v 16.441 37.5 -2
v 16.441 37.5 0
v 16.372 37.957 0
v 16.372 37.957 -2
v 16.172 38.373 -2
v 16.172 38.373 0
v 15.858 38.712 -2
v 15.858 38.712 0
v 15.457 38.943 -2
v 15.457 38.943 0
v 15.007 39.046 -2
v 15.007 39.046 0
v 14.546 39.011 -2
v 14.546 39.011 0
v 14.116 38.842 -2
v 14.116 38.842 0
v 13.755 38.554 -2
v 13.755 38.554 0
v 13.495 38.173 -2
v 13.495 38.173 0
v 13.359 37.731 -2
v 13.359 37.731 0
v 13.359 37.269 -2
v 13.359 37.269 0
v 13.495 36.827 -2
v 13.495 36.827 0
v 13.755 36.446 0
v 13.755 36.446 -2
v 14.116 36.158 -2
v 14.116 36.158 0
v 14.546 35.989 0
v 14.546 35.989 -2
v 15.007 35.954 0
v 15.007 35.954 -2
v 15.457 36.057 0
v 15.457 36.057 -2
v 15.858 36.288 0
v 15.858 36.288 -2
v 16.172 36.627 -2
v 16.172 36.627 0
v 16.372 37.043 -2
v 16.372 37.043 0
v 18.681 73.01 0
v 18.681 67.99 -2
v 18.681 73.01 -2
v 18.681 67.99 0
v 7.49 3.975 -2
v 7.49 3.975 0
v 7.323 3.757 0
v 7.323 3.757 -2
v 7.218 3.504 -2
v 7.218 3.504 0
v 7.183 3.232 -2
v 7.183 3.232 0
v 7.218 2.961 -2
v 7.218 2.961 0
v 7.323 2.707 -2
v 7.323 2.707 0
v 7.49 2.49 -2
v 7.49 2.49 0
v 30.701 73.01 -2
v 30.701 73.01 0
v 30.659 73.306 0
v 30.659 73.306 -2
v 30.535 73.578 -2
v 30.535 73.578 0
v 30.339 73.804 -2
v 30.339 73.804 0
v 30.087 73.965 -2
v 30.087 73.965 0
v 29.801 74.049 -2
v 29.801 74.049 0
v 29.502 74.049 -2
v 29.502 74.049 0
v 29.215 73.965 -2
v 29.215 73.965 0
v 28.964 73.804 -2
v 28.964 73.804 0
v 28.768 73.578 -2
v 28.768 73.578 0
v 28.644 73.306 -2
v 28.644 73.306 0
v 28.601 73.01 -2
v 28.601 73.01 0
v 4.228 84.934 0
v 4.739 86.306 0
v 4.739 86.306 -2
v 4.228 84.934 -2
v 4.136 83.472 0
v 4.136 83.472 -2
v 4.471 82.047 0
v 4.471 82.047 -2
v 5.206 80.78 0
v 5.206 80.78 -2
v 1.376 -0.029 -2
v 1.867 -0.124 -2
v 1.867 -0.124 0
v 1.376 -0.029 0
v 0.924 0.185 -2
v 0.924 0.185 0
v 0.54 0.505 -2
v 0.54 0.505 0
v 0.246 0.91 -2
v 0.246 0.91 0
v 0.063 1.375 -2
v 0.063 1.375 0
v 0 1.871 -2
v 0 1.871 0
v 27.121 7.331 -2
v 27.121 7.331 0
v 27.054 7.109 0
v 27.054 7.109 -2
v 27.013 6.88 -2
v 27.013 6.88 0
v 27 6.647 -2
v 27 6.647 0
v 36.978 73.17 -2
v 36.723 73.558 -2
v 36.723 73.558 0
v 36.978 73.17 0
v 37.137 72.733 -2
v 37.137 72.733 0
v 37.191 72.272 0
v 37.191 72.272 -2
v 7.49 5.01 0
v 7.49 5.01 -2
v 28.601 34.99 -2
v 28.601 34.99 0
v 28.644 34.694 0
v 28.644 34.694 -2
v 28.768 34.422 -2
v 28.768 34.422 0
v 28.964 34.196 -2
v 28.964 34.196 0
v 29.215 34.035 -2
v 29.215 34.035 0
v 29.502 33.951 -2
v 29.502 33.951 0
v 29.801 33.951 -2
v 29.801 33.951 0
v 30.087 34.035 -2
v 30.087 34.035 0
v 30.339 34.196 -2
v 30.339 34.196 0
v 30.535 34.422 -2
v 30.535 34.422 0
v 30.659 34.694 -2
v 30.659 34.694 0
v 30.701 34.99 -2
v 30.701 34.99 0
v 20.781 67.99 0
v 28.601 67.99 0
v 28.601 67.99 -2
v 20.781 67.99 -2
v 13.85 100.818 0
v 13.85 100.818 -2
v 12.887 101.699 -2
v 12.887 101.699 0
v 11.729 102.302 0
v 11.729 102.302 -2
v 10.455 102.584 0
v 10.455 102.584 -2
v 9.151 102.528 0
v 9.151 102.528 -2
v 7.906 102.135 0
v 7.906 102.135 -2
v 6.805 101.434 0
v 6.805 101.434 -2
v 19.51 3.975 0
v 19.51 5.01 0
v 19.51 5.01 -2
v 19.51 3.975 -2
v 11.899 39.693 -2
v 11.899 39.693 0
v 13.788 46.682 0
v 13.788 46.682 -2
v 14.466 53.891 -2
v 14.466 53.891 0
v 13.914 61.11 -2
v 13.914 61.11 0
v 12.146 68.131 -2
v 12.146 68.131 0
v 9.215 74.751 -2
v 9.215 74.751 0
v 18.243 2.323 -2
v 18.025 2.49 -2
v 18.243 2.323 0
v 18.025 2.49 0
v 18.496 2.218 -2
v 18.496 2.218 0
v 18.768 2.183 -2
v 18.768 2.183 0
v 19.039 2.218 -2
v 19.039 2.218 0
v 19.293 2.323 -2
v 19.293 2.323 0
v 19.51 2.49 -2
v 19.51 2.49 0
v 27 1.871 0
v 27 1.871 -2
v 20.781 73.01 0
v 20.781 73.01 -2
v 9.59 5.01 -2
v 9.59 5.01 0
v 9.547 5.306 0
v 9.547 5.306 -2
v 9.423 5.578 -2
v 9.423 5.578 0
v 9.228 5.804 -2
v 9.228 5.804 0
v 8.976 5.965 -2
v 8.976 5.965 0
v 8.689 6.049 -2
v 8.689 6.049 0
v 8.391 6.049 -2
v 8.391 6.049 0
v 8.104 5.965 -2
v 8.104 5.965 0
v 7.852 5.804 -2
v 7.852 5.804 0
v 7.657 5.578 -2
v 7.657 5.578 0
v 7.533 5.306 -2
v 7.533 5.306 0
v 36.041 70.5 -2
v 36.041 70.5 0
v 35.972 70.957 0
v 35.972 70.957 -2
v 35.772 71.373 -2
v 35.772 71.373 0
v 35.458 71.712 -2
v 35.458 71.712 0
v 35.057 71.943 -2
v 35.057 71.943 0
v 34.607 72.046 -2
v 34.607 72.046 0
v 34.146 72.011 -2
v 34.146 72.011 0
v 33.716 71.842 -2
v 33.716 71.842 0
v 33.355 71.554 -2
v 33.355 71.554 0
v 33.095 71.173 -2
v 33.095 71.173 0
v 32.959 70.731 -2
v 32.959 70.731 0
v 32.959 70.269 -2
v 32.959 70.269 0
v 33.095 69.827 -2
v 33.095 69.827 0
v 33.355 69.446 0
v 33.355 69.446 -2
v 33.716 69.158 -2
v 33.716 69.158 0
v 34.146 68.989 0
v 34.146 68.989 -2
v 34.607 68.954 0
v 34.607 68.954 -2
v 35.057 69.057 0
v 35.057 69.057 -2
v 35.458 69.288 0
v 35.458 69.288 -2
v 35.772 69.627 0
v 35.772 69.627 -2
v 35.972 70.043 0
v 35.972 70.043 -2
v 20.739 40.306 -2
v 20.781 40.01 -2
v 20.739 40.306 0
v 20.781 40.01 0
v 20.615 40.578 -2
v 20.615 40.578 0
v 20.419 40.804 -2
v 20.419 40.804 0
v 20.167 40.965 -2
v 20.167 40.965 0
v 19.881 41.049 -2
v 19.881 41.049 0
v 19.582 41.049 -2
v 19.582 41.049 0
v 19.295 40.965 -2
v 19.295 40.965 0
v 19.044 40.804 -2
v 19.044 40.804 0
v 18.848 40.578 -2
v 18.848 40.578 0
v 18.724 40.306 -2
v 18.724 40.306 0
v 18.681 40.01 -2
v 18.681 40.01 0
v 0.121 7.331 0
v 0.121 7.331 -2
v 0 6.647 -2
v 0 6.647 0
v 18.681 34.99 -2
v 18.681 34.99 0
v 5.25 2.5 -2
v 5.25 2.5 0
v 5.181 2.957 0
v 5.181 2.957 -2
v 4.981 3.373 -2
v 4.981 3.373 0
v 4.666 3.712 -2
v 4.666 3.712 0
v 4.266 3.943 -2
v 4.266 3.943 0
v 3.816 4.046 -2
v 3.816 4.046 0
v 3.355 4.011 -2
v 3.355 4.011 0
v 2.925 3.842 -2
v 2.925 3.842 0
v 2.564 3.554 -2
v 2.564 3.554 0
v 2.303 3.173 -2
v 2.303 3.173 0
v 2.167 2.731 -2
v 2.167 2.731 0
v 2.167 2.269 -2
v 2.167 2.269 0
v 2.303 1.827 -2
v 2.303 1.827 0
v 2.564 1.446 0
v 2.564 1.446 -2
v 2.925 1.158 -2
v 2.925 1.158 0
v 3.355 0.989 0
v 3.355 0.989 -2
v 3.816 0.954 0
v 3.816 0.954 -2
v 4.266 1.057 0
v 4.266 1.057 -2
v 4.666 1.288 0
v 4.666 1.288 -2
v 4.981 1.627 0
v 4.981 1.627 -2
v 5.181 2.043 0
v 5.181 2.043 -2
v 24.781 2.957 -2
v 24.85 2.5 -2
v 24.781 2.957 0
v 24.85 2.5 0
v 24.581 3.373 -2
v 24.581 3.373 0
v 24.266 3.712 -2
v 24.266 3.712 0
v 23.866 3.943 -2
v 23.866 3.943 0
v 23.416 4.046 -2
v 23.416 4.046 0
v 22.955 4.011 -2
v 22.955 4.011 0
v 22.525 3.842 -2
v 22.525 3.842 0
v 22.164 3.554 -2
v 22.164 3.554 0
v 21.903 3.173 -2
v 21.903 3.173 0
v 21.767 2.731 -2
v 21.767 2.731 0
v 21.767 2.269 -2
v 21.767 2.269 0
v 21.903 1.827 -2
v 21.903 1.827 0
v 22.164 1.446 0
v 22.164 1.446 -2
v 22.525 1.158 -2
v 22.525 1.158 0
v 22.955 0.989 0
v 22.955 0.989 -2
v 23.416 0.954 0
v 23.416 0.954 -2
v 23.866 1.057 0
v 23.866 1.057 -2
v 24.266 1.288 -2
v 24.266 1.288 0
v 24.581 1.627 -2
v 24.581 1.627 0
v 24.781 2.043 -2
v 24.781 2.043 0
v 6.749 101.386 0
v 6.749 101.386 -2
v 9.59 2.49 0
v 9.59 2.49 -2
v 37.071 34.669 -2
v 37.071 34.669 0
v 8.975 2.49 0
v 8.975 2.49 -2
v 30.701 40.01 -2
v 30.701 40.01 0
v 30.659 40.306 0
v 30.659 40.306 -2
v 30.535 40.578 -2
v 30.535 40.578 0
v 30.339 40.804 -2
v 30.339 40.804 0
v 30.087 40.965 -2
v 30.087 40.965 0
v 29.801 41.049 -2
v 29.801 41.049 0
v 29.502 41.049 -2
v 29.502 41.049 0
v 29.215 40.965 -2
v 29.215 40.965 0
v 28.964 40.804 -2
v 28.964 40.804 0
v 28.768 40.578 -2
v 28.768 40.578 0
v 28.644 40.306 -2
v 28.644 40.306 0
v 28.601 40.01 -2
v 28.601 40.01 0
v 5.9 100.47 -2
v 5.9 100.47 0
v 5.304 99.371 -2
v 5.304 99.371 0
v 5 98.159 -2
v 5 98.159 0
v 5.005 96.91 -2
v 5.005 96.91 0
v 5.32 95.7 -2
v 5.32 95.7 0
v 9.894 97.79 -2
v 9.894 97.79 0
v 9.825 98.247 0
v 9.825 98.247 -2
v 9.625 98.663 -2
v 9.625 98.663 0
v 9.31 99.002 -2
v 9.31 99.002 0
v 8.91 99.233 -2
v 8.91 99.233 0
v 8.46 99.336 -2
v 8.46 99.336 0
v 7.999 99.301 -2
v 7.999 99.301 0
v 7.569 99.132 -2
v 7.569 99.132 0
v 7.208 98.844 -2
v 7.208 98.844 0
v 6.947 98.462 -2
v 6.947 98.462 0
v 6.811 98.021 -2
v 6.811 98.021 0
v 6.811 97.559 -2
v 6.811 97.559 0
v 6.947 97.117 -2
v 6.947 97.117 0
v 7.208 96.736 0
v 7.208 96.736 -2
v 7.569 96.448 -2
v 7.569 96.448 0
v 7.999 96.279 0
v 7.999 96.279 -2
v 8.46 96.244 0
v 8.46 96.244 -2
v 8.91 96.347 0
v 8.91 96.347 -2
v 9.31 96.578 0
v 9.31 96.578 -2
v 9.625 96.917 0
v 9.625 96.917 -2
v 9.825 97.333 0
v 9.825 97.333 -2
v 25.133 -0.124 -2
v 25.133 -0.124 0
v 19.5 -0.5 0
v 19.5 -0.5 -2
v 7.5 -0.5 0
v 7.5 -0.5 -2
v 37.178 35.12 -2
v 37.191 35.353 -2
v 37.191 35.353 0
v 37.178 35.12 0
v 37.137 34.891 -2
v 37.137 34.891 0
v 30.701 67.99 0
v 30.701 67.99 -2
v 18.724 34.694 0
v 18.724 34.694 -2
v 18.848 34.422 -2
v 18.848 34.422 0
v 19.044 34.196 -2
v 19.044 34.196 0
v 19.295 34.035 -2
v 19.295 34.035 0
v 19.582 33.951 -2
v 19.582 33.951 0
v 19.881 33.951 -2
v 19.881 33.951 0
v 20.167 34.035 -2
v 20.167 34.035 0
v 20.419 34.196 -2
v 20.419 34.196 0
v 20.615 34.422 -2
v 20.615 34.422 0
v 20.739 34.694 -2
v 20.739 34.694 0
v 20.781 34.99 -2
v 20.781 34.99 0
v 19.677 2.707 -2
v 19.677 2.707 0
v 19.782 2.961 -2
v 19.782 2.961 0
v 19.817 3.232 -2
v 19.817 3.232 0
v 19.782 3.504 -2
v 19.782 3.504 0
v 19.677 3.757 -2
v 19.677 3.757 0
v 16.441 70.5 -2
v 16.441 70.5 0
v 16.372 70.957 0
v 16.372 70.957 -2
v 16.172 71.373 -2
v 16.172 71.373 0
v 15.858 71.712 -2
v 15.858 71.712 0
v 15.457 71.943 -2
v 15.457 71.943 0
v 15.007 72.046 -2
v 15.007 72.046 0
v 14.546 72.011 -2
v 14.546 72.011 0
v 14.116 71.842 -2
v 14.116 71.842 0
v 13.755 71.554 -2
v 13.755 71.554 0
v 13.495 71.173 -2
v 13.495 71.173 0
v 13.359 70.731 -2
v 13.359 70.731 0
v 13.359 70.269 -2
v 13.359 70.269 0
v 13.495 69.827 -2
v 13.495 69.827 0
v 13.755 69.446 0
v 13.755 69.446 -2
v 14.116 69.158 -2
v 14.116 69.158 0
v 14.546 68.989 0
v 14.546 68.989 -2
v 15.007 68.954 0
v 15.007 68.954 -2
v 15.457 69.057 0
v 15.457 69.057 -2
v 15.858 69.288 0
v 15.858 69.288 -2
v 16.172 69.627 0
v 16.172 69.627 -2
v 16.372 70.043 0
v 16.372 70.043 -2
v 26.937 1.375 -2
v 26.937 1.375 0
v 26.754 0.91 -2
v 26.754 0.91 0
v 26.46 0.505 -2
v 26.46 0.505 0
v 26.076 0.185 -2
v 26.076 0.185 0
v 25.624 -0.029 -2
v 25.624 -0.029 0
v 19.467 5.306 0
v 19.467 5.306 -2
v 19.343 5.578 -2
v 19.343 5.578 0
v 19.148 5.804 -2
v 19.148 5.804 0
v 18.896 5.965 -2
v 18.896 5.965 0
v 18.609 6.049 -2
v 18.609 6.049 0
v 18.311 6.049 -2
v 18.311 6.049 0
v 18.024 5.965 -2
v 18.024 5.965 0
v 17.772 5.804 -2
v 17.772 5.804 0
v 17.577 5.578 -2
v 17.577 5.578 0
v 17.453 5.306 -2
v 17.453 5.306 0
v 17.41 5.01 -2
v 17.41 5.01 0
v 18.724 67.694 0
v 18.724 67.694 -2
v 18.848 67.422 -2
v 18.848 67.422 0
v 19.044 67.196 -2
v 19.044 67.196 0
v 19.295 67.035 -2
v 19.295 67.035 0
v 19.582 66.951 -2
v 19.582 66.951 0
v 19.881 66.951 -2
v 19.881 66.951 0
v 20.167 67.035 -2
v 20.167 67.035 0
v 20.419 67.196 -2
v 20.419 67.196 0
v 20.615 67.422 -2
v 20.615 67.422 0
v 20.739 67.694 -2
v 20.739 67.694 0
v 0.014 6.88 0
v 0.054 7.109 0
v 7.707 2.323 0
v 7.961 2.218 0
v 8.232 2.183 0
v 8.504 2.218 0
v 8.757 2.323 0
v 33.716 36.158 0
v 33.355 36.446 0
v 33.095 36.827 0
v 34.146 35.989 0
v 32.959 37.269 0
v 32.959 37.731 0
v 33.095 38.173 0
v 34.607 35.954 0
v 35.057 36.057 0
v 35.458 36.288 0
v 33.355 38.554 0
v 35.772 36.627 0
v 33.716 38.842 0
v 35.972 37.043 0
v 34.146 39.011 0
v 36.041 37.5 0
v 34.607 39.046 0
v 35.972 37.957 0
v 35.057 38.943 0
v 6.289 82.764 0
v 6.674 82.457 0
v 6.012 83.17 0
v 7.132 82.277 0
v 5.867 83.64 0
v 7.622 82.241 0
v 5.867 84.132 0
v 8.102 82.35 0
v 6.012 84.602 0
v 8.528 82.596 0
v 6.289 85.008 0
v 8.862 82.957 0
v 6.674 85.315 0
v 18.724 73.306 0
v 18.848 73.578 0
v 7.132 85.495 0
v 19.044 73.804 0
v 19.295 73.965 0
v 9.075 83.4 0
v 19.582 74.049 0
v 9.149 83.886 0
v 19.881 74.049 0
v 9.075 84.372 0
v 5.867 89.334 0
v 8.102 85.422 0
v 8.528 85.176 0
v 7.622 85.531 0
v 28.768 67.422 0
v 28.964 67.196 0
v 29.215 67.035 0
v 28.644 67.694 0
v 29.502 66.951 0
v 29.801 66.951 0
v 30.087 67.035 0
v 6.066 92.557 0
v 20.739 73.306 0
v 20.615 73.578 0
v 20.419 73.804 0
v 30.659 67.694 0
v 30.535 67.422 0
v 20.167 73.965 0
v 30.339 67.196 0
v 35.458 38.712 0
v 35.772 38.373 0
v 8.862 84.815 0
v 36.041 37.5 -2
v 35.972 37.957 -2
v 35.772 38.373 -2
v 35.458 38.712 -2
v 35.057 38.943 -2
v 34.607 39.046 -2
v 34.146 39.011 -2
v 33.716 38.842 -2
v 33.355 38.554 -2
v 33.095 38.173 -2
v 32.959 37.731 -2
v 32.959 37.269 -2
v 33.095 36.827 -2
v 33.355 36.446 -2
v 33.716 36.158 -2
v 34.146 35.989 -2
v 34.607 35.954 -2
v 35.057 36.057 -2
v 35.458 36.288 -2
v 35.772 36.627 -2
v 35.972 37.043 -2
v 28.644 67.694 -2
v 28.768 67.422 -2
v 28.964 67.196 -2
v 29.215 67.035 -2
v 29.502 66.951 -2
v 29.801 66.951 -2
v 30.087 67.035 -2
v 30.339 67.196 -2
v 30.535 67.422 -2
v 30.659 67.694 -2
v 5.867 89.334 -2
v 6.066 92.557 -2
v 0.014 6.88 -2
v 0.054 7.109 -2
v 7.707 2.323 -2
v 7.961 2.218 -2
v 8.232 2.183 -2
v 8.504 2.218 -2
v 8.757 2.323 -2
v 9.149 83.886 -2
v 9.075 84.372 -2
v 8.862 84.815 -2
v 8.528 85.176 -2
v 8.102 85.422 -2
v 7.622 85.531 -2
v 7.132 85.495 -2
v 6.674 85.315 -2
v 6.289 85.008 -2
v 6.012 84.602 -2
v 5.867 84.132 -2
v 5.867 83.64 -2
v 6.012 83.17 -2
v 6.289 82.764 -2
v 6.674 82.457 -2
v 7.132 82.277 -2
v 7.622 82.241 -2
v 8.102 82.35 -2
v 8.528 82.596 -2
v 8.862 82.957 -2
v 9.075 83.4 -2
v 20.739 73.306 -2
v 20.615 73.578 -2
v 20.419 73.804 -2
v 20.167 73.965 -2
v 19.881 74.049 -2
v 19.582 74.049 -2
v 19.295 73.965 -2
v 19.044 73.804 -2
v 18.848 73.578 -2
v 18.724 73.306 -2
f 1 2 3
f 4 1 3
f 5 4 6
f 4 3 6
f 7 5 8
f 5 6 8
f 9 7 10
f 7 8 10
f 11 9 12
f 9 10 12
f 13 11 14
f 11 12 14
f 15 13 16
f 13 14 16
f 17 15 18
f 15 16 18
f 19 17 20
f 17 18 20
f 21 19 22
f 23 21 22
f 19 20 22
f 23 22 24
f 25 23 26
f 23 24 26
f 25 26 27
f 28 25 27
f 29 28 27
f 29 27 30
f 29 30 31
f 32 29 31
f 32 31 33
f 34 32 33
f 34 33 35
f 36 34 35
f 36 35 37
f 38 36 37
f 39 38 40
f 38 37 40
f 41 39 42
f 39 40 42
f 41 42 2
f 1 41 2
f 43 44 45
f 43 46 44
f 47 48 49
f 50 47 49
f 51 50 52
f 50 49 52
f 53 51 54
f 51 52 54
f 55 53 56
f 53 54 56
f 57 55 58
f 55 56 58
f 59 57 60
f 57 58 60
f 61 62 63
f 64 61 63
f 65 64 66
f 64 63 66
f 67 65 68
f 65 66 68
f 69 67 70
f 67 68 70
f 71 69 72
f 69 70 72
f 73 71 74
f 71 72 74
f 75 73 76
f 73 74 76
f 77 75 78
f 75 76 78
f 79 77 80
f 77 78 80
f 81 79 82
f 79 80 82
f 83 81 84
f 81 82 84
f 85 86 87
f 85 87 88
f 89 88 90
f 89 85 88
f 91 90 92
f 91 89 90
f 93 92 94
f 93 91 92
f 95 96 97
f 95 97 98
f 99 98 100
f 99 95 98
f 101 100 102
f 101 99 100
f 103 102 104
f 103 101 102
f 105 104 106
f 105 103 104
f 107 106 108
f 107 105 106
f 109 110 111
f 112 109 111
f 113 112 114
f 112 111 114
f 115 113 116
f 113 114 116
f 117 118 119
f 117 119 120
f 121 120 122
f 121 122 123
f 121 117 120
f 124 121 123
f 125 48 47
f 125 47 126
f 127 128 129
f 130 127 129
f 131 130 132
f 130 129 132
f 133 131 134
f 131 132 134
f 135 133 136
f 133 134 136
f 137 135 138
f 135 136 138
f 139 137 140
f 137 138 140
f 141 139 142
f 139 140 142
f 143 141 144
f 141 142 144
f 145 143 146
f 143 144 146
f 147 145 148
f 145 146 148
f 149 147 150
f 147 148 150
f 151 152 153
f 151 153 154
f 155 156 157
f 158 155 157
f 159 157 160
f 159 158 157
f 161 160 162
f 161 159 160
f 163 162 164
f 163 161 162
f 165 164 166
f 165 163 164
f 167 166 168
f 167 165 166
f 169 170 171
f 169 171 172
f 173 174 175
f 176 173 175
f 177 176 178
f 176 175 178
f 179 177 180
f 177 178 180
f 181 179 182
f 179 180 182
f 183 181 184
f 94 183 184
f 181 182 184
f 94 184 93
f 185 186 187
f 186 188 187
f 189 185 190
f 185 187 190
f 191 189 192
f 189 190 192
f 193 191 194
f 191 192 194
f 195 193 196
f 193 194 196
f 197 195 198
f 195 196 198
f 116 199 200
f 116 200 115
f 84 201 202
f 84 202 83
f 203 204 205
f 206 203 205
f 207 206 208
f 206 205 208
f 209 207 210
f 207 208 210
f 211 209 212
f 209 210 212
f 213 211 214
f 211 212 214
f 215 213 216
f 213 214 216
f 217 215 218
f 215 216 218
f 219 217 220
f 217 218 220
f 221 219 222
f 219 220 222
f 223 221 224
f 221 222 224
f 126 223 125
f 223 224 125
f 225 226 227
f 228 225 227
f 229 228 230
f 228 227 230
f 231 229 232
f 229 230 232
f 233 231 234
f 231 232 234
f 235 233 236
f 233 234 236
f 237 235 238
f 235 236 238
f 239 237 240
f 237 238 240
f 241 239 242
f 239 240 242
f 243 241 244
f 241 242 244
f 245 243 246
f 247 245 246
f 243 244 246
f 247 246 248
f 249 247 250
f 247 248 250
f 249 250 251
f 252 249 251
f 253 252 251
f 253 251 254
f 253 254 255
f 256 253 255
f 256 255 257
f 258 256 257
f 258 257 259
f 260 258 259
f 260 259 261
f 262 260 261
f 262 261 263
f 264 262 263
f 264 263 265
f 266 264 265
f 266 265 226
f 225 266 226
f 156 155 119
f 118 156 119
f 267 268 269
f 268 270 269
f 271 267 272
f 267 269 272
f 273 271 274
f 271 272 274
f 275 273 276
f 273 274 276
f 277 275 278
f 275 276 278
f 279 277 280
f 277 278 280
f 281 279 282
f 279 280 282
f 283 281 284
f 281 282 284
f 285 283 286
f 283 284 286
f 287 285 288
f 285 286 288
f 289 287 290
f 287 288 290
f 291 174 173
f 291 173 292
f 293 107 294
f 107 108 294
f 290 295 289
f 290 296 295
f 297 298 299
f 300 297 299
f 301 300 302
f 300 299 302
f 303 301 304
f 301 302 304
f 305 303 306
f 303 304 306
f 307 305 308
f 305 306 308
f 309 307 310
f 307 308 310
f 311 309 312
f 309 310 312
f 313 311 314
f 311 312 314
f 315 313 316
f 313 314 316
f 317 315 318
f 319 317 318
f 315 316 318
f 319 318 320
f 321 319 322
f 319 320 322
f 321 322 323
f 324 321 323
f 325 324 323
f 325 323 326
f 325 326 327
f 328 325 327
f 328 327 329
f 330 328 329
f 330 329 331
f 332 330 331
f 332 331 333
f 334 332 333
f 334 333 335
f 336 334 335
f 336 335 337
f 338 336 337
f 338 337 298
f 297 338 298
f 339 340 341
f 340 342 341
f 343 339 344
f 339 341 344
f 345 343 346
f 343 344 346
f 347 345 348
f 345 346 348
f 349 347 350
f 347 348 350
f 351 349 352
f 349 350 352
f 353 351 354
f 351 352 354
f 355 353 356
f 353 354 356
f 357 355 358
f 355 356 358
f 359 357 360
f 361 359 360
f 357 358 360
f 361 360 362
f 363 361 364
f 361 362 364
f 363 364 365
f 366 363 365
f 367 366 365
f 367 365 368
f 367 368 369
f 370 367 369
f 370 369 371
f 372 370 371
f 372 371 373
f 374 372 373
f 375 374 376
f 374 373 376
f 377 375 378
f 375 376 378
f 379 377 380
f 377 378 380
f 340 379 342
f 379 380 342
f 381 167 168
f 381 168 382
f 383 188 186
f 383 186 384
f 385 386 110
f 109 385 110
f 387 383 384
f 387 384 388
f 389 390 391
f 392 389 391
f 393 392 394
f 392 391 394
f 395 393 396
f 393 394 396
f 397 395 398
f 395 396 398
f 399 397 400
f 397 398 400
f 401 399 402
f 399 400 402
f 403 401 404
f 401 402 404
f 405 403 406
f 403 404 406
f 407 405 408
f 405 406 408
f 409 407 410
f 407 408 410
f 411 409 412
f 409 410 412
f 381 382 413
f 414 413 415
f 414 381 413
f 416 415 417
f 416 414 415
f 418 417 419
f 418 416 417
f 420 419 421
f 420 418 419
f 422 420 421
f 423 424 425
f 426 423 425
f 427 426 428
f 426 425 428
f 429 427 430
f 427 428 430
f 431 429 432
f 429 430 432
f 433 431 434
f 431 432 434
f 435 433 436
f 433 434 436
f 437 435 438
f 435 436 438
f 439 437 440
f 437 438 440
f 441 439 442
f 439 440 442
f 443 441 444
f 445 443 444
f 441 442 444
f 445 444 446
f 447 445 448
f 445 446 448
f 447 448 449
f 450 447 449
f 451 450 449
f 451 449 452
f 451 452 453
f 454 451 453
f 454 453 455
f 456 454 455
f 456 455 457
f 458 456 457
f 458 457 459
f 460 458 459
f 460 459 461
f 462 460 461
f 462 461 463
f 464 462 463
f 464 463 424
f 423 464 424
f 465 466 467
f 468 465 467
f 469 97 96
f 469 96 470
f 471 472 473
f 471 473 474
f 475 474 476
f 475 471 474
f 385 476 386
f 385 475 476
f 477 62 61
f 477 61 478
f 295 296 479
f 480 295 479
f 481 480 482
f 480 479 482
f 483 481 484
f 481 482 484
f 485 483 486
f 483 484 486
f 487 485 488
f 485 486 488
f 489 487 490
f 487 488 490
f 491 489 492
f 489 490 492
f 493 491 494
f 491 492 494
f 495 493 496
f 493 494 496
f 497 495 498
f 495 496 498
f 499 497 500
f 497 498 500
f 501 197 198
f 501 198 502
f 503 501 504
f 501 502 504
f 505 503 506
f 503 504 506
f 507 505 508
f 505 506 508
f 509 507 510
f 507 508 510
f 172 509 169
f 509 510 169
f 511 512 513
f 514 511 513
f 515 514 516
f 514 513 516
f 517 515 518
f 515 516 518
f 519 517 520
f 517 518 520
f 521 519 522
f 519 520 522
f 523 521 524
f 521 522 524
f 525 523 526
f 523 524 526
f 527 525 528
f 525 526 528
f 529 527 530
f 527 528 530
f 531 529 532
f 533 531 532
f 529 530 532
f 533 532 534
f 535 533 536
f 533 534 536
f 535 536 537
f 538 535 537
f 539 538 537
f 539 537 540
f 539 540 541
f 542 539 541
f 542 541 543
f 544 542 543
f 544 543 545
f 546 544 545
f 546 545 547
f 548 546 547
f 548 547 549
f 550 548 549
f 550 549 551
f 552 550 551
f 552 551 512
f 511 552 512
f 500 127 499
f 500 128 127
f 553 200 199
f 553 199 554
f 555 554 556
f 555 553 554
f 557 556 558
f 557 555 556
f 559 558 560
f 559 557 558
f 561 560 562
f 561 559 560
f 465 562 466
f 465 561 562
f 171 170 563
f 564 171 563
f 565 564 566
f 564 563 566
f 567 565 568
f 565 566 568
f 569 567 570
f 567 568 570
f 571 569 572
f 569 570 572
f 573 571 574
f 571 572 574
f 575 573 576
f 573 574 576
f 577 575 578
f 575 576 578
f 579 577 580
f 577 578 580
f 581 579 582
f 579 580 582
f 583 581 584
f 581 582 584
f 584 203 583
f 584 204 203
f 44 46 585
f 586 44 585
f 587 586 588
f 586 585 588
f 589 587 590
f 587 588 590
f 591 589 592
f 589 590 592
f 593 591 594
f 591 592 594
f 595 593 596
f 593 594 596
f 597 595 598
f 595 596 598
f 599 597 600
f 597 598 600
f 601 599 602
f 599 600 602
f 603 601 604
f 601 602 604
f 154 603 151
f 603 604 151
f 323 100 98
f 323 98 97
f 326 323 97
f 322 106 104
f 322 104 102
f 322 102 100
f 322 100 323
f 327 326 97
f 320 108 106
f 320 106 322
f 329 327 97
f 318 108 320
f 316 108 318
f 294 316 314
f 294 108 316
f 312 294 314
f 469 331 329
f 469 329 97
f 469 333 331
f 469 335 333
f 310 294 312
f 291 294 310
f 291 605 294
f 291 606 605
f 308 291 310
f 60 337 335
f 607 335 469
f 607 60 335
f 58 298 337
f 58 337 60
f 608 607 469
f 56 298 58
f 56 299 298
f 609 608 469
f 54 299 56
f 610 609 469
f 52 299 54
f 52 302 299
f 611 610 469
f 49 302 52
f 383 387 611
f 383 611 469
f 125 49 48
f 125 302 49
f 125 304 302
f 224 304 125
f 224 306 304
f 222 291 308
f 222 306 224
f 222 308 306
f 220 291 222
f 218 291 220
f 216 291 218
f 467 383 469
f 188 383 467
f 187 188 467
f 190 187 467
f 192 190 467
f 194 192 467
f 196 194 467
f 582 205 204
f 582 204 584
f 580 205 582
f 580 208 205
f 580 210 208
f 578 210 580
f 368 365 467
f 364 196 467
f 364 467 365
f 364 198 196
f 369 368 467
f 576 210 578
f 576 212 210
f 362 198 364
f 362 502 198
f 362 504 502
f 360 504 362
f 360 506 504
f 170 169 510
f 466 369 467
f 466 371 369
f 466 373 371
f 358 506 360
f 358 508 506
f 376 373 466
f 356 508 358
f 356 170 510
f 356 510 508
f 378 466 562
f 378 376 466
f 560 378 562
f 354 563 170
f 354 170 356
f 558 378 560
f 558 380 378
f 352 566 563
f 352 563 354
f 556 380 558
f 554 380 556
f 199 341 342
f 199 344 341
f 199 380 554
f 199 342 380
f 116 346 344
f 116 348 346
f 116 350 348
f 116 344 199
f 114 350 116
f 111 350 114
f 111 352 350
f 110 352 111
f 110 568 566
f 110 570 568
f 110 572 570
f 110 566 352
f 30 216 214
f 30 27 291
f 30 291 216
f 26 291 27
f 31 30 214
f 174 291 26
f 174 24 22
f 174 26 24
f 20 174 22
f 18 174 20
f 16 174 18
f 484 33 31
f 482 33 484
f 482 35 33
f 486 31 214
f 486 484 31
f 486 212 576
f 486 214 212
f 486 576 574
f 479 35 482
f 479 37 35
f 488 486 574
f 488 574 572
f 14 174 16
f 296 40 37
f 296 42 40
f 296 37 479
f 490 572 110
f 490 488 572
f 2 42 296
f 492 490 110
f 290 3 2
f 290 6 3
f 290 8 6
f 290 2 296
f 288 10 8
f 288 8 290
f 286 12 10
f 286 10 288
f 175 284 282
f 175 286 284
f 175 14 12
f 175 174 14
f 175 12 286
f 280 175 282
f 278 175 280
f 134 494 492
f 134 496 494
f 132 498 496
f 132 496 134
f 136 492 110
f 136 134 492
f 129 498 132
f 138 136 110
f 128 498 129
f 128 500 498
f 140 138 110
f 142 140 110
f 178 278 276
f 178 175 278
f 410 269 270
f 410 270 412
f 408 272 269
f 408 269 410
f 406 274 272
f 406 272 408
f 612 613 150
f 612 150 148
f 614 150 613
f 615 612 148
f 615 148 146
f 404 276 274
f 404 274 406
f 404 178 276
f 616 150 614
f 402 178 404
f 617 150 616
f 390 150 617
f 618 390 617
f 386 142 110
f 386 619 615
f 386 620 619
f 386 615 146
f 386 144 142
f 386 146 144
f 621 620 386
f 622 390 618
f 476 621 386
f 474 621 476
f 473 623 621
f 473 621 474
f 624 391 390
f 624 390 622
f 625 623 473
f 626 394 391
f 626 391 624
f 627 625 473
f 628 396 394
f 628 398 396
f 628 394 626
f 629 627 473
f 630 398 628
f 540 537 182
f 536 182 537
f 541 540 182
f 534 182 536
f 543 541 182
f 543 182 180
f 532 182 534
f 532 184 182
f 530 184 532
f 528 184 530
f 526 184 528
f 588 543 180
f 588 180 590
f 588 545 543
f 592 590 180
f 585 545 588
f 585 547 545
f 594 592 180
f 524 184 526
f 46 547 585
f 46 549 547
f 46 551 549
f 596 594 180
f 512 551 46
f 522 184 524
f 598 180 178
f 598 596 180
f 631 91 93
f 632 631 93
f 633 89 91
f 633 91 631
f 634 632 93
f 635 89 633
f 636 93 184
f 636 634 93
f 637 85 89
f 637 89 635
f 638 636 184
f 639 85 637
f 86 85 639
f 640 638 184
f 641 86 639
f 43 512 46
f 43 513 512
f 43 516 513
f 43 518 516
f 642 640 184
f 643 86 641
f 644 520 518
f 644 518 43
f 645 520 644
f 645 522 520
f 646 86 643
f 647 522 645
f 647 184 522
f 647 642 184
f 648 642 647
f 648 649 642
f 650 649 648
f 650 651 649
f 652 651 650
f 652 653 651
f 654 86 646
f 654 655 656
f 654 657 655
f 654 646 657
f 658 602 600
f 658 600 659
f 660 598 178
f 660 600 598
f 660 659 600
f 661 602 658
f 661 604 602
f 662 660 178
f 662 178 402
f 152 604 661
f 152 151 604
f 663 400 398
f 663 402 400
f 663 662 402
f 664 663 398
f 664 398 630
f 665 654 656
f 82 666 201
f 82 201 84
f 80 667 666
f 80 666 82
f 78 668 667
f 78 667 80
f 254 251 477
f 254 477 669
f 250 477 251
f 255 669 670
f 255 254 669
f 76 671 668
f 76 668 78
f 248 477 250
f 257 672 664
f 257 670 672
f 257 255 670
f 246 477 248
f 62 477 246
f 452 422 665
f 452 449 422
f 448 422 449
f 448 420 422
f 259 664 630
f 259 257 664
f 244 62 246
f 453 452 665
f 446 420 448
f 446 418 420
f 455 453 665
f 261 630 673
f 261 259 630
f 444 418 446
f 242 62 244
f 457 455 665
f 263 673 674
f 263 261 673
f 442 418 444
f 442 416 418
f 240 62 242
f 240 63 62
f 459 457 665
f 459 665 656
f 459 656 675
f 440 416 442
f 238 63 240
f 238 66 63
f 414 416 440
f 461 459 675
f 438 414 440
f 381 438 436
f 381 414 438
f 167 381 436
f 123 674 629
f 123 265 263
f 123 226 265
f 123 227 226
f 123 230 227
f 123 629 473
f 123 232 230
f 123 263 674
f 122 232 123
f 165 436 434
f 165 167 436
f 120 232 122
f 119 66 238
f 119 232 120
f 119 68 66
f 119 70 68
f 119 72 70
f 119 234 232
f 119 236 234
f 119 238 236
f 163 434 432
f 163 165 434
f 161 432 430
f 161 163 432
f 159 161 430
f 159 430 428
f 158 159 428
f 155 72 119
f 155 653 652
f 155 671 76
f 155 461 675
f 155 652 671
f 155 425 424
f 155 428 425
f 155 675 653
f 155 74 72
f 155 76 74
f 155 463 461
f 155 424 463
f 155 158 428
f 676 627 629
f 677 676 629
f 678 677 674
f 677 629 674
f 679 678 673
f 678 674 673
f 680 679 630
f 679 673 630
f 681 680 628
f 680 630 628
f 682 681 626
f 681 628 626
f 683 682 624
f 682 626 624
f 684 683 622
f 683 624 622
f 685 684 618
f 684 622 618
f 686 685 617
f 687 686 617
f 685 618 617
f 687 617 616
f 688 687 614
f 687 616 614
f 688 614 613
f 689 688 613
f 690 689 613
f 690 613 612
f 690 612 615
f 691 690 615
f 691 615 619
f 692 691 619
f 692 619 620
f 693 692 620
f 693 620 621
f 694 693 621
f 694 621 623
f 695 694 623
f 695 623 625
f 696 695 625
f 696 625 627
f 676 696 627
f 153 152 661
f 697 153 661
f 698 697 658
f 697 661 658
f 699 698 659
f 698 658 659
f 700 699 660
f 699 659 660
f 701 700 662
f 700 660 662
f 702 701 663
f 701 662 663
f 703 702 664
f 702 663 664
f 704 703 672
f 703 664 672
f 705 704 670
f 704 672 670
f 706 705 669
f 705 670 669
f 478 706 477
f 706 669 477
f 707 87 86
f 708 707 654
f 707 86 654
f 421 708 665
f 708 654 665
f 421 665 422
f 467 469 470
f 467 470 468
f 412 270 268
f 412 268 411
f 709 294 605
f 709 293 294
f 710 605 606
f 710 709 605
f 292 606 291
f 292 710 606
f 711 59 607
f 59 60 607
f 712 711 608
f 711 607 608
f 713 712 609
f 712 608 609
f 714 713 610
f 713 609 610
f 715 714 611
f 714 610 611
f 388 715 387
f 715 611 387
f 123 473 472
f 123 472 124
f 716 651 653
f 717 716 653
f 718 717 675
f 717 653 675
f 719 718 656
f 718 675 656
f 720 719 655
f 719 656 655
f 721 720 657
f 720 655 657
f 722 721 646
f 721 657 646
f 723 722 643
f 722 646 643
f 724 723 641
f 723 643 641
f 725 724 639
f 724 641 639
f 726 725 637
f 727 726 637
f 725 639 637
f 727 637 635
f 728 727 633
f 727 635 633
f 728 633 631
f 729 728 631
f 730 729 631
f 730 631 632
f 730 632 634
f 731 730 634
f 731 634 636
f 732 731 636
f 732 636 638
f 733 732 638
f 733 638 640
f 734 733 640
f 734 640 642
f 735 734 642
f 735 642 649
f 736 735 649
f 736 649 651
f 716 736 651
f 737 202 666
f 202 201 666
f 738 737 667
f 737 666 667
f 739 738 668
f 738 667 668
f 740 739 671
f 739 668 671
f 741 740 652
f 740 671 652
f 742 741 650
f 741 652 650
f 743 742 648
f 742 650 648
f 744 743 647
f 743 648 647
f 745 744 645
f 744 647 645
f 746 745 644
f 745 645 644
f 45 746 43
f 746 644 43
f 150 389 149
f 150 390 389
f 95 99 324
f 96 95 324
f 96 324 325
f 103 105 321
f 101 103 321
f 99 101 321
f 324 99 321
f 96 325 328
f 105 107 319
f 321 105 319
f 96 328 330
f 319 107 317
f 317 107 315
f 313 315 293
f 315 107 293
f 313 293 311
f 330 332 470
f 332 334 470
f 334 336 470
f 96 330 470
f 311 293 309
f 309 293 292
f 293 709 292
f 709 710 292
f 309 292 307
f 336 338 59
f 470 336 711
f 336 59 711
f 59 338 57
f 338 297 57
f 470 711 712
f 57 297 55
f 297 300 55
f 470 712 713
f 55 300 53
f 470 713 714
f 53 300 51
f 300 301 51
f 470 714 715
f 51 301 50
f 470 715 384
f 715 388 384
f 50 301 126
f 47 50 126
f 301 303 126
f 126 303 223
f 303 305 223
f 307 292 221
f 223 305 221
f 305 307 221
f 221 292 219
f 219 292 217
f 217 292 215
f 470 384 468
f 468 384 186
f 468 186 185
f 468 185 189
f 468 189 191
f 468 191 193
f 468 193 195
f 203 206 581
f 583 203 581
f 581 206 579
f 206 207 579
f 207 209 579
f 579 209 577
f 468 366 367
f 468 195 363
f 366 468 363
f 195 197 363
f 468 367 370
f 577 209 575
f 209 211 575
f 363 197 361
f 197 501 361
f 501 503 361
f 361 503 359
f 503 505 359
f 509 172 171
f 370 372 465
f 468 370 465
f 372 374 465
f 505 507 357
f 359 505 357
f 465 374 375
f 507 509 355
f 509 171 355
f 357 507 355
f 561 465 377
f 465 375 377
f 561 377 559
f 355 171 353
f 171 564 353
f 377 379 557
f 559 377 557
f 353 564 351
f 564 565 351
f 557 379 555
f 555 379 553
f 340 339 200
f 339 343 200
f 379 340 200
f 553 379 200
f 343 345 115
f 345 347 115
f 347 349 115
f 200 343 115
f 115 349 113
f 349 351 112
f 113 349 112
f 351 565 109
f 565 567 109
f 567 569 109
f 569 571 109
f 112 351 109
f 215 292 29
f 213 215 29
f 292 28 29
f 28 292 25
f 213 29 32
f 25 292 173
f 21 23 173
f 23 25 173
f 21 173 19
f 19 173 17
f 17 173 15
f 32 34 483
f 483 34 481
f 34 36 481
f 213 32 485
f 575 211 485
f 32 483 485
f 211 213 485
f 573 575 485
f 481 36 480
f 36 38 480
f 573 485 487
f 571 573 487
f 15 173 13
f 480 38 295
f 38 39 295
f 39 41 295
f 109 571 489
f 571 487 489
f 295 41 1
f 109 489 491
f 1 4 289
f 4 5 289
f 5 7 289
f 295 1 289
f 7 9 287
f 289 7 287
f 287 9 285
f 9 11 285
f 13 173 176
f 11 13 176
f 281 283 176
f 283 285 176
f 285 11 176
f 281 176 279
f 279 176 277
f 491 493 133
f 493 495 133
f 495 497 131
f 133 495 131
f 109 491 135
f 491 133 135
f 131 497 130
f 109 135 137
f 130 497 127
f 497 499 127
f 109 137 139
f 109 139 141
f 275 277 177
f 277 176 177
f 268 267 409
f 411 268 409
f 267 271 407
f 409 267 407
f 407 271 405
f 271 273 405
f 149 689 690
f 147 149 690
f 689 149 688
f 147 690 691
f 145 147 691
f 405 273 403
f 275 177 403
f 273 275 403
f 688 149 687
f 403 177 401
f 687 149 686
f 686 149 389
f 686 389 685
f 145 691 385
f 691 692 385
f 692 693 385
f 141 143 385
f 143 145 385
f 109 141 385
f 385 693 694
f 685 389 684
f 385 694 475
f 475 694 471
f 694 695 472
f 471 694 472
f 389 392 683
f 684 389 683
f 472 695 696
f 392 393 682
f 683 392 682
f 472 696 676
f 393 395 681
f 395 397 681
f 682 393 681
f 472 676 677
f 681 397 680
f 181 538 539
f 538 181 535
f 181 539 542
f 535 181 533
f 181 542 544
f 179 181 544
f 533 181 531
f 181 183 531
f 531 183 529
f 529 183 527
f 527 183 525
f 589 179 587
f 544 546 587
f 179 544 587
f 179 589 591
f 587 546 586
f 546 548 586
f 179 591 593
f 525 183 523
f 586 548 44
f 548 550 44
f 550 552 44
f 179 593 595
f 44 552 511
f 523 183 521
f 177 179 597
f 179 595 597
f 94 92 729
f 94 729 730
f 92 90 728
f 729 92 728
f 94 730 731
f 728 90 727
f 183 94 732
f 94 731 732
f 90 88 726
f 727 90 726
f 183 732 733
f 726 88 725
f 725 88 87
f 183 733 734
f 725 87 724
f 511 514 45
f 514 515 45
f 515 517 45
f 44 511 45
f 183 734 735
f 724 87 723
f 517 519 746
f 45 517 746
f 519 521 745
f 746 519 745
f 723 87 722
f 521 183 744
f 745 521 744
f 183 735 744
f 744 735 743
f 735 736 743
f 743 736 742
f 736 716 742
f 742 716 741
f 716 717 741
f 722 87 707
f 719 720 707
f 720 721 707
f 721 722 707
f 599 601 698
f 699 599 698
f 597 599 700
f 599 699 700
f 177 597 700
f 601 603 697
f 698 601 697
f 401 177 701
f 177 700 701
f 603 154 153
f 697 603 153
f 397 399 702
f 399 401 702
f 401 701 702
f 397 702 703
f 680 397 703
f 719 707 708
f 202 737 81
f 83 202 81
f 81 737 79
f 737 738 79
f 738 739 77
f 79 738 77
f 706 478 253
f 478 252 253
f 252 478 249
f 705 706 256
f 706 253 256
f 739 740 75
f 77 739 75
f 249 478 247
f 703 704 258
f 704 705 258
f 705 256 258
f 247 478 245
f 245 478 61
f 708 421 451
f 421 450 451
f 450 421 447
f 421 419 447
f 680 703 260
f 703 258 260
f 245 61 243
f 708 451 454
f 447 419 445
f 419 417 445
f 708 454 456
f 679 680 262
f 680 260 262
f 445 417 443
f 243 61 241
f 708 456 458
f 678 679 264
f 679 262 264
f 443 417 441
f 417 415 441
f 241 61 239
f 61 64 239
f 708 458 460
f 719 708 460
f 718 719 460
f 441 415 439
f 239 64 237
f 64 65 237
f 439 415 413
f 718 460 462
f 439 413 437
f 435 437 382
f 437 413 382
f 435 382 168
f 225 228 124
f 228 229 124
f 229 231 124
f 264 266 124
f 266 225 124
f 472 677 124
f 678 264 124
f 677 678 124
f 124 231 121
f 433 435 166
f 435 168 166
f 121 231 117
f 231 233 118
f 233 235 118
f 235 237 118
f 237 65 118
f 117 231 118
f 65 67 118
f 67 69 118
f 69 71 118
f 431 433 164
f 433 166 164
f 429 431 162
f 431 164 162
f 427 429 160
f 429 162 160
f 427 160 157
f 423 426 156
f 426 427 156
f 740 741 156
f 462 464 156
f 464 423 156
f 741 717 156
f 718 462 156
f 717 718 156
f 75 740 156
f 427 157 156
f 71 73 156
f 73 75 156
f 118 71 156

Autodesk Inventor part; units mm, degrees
ref_plane "YZ Plane" through (0, 0, 0) normal (1, 0, 0) x (0, 1, 0)
ref_plane "XZ Plane" through (0, 0, 0) normal (0, 1, 0) x (-1, 0, 0)
ref_plane "XY Plane" through (0, 0, 0) normal (0, 0, 1) x (1, 0, 0)
sketch "スケッチ1" plane through (0, 0, 0) normal (0, 0, 1) x (1, 0, 0)
  line L0 (0, 0) -> (27, 0) construction
  line L1 (27, 0) -> (27, 5) construction
  line L2 (27, 5) -> (0, 5) construction
  line L3 (0, 5) -> (0, 0) construction
  line L4 (0, 2.5) -> (27, 2.5) construction
  line L5 (13.5, 5) -> (13.5, 0) construction
  circle A0 centre (3.7, 2.5) radius 1.55
  line L6 (7.5, 5) -> (7.5, 0) construction
  circle A1 centre (23.3, 2.5) radius 1.55
  line L7 (19.5, 5) -> (19.5, 0) construction
  line L8 (7.49, 5.01) -> (9.59, 5.01) construction
  line L9 (19.51, 5.01) -> (19.51, 2.49)
  line L10 (19.51, 2.49) -> (7.49, 2.49)
  line L11 (7.49, 2.49) -> (7.49, 5.01)
  line L12 (7.49, 5.01) -> (19.51, 2.49) construction
  line L13 (19.51, 5.01) -> (7.49, 2.49) construction
  arc A2 (9.59, 5.01) -> (7.49, 5.01) centre (8.54, 5.01) ccw
  arc A3 (19.51, 5.01) -> (17.41, 5.01) centre (18.46, 5.01) ccw
  line L14 (9.59, 5.01) -> (17.41, 5.01)
  line L15 (9.59, 2.49) -> (7.49, 2.49)
  line L16 (17.41, 5.01) -> (19.51, 5.01) construction
  line L17 (27, 7) -> (0, 7) construction
  line L18 (0, 0) -> (0, 7)
  line L19 (12.1912, 35) -> (37.1912, 35) construction
  line L20 (37.1912, 35) -> (37.1912, 40) construction
  line L21 (37.1912, 40) -> (12.1912, 40) construction
  line L22 (12.1912, 40) -> (12.1912, 35) construction
  line L23 (12.1912, 37.5) -> (37.1912, 37.5) construction
  line L24 (24.6912, 40) -> (24.6912, 35) construction
  circle A4 centre (14.8912, 37.5) radius 1.55
  line L25 (18.6912, 40) -> (18.6912, 35) construction
  line L26 (30.6912, 40) -> (30.6912, 35) construction
  circle A5 centre (34.4912, 37.5) radius 1.55
  line L27 (18.6812, 40.01) -> (20.7812, 40.01) construction
  line L28 (30.7012, 40.01) -> (30.7012, 34.99)
  line L29 (30.7012, 34.99) -> (28.6012, 34.99) construction
  line L30 (18.6812, 34.99) -> (18.6812, 40.01)
  line L31 (18.6812, 40.01) -> (30.7012, 34.99) construction
  line L32 (30.7012, 40.01) -> (18.6812, 34.99) construction
  arc A6 (20.7812, 40.01) -> (18.6812, 40.01) centre (19.7312, 40.01) ccw
  arc A7 (18.6812, 34.99) -> (20.7812, 34.99) centre (19.7312, 34.99) ccw
  arc A8 (30.7012, 40.01) -> (28.6012, 40.01) centre (29.6512, 40.01) ccw
  arc A9 (28.6012, 34.99) -> (30.7012, 34.99) centre (29.6512, 34.99) ccw
  line L33 (20.7812, 40.01) -> (28.6012, 40.01)
  line L34 (20.7812, 34.99) -> (18.6812, 34.99) construction
  line L35 (28.6012, 40.01) -> (30.7012, 40.01) construction
  line L36 (28.6012, 34.99) -> (20.7812, 34.99)
  line L37 (12.1912, 73) -> (12.1912, 68) construction
  circle A10 centre (14.8912, 70.5) radius 1.55
  line L38 (37.1912, 68) -> (37.1912, 73) construction
  line L39 (30.6912, 73) -> (30.6912, 68) construction
  circle A11 centre (34.4912, 70.5) radius 1.55
  line L40 (30.7012, 73.01) -> (30.7012, 67.99)
  line L41 (18.6912, 73) -> (18.6912, 68) construction
  line L42 (12.1912, 68) -> (37.1912, 68) construction
  line L43 (37.1912, 73) -> (12.1912, 73) construction
  line L44 (12.1912, 70.5) -> (37.1912, 70.5) construction
  line L45 (24.6912, 73) -> (24.6912, 68) construction
  line L46 (20.7812, 73.01) -> (28.6012, 73.01)
  line L47 (28.6012, 67.99) -> (20.7812, 67.99)
  line L48 (18.6812, 73.01) -> (30.7012, 67.99) construction
  line L49 (30.7012, 73.01) -> (18.6812, 67.99) construction
  arc A12 (30.7012, 73.01) -> (28.6012, 73.01) centre (29.6512, 73.01) ccw
  line L50 (28.6012, 73.01) -> (30.7012, 73.01) construction
  arc A13 (28.6012, 67.99) -> (30.7012, 67.99) centre (29.6512, 67.99) ccw
  line L51 (30.7012, 67.99) -> (28.6012, 67.99) construction
  line L52 (18.6812, 73.01) -> (20.7812, 73.01) construction
  line L53 (20.7812, 67.99) -> (18.6812, 67.99) construction
  arc A14 (20.7812, 73.01) -> (18.6812, 73.01) centre (19.7312, 73.01) ccw
  arc A15 (18.6812, 67.99) -> (20.7812, 67.99) centre (19.7312, 67.99) ccw
  line L54 (18.6812, 67.99) -> (18.6812, 73.01)
  line L55 (27, 0) -> (27, 6.6473)
  line L56 (37.1912, 35) -> (27.1206, 7.3314)
  line L57 (11.8992, 39.6929) -> (0, 7)
  line L58 (37.1912, 35) -> (37.1912, 73)
  line L59 (6.8054, 101.4338) -> (6.7491, 101.3865)
  arc A16 (4.7394, 86.3065) -> (5.3203, 95.7003) centre (-4.8938, 91.617) ccw
  circle A17 centre (-4.8938, 91.617) radius 14.6063 construction
  line L60 (1.0459, 61.9185) -> (-21.5815, 84.5459) construction
  line L61 (-21.5815, 84.5459) -> (-18.0459, 88.0815) construction
  line L62 (-18.0459, 88.0815) -> (4.5815, 65.4541) construction
  line L63 (4.5815, 65.4541) -> (1.0459, 61.9185) construction
  line L64 (1.0459, 61.9185) -> (-18.0459, 88.0815) construction
  line L65 (-21.5815, 84.5459) -> (4.5815, 65.4541) construction
  line L66 (13.8495, 100.8175) -> (37.1912, 73)
  arc A18 (11.8992, 39.6929) -> (5.2055, 80.7796) centre (-28.1256, 54.2607) ccw
  arc A19 (8.344, 97.7899) -> (6.2953, 101.0057) centre (-4.8938, 91.617) ccw construction
  arc A20 (5.0756, 80.942) -> (7.4988, 83.886) centre (-4.8938, 91.617) ccw construction
  circle A21 centre (8.344, 97.7899) radius 1.55
  circle A22 centre (7.4988, 83.886) radius 1.65
  arc A23 (13.8495, 100.8175) -> (6.8054, 101.4338) centre (10.0193, 97.6035) ccw
  arc A24 (6.7491, 101.3865) -> (5.3203, 95.7003) centre (9.9631, 97.5563) ccw
  arc A25 (4.7394, 86.3065) -> (5.2055, 80.7796) centre (9.1182, 83.8926) ccw
  arc A26 (27.1206, 7.3314) -> (27, 6.6473) centre (29, 6.6473) ccw
  arc A27 (7.49, 3.9749) -> (8.9749, 2.49) centre (8.2325, 3.2325) ccw
  arc A28 (18.0251, 2.49) -> (19.51, 3.9749) centre (18.7675, 3.2325) ccw
  line L67 (0, 0) -> (7.5, -0.5)
  line L68 (7.5, -0.5) -> (19.5, -0.5)
  line L69 (27, 0) -> (19.5, -0.5)
  point P0 (24.6912, 37.5)
  point P1 (24.6912, 70.5)
  point P2 (10.6356, 104.6477)
  point P3 (3.5327, 98.6877)
  point P4 (-8.5, 75)
  point P5 (19.51, 3.9749)
  point P6 (18.0251, 2.49)
  point P7 (5.8711, 81.4297)
  dimension "d0" = 27
  dimension "d1" = 5
  dimension "d2" = 3.1
  dimension "d3" = 12
  dimension "d4" = 19.6
  dimension "d9" = 1.05
  dimension "d10" = 7
  dimension "d11" = 25
  dimension "d12" = 5
  dimension "d13" = 3.1
  dimension "d14" = 12
  dimension "d15" = 19.6
  dimension "d16" = 0.01
  dimension "d17" = 0.01
  dimension "d20" = 1.05
  dimension "d22" = 25
  dimension "d23" = 5
  dimension "d24" = 3.1
  dimension "d25" = 12
  dimension "d26" = 19.6
  dimension "d27" = 0.01
  dimension "d28" = 0.01
  dimension "d29" = 1.05
  dimension "d30" = 70
  dimension "d31" = 66
  dimension "d32" = 33
  dimension "d37" = 5
  dimension "d38" = 75
  dimension "d39" = 135
  dimension "d40" = 8.5
  dimension "d46" = 11.8
  dimension "d47" = 32
  dimension "d48" = 50
  dimension "d49" = 6.8
  dimension "d50" = 11
  dimension "d51" = 29.2126
  dimension "d54" = 15
  dimension "d55" = 15
  dimension "d56" = 3.1
  dimension "d57" = 3.3
  dimension "d60" = 5
  dimension "d61" = 2
  dimension "d62" = 1.05
  dimension "d64" = 2.52
  dimension "d65" = 0.01
  dimension "d66" = 0.01
  dimension "d67" = 0.5
  dimension "d69" = 12
extrude "押し出し1" add sketch "スケッチ1" against normal blind 2
fillet "フィレット1" radius 2 5 edges at (37.1912, 73, -1) (37.1912, 35, -1) (0, 7, -1) (27, 0, -1) (0, 0, -1)
equation "\"d12\" = d1"
equation "\"d13\" = d2"
equation "\"d14\" = d3"
equation "\"d15\" = d4"
equation "\"d16\" = d6"
equation "\"d17\" = d6"
equation "\"d22\" = d11"
equation "\"d23\" = d1"
equation "\"d24\" = d2"
equation "\"d25\" = d3"
equation "\"d26\" = d4"
equation "\"d27\" = d6"
equation "\"d28\" = d6"
equation "\"d32\" = 0.5 * d31"
equation "\"d6\" = 0.01"
properties part number "Head_side_frame" material "GFRP"
